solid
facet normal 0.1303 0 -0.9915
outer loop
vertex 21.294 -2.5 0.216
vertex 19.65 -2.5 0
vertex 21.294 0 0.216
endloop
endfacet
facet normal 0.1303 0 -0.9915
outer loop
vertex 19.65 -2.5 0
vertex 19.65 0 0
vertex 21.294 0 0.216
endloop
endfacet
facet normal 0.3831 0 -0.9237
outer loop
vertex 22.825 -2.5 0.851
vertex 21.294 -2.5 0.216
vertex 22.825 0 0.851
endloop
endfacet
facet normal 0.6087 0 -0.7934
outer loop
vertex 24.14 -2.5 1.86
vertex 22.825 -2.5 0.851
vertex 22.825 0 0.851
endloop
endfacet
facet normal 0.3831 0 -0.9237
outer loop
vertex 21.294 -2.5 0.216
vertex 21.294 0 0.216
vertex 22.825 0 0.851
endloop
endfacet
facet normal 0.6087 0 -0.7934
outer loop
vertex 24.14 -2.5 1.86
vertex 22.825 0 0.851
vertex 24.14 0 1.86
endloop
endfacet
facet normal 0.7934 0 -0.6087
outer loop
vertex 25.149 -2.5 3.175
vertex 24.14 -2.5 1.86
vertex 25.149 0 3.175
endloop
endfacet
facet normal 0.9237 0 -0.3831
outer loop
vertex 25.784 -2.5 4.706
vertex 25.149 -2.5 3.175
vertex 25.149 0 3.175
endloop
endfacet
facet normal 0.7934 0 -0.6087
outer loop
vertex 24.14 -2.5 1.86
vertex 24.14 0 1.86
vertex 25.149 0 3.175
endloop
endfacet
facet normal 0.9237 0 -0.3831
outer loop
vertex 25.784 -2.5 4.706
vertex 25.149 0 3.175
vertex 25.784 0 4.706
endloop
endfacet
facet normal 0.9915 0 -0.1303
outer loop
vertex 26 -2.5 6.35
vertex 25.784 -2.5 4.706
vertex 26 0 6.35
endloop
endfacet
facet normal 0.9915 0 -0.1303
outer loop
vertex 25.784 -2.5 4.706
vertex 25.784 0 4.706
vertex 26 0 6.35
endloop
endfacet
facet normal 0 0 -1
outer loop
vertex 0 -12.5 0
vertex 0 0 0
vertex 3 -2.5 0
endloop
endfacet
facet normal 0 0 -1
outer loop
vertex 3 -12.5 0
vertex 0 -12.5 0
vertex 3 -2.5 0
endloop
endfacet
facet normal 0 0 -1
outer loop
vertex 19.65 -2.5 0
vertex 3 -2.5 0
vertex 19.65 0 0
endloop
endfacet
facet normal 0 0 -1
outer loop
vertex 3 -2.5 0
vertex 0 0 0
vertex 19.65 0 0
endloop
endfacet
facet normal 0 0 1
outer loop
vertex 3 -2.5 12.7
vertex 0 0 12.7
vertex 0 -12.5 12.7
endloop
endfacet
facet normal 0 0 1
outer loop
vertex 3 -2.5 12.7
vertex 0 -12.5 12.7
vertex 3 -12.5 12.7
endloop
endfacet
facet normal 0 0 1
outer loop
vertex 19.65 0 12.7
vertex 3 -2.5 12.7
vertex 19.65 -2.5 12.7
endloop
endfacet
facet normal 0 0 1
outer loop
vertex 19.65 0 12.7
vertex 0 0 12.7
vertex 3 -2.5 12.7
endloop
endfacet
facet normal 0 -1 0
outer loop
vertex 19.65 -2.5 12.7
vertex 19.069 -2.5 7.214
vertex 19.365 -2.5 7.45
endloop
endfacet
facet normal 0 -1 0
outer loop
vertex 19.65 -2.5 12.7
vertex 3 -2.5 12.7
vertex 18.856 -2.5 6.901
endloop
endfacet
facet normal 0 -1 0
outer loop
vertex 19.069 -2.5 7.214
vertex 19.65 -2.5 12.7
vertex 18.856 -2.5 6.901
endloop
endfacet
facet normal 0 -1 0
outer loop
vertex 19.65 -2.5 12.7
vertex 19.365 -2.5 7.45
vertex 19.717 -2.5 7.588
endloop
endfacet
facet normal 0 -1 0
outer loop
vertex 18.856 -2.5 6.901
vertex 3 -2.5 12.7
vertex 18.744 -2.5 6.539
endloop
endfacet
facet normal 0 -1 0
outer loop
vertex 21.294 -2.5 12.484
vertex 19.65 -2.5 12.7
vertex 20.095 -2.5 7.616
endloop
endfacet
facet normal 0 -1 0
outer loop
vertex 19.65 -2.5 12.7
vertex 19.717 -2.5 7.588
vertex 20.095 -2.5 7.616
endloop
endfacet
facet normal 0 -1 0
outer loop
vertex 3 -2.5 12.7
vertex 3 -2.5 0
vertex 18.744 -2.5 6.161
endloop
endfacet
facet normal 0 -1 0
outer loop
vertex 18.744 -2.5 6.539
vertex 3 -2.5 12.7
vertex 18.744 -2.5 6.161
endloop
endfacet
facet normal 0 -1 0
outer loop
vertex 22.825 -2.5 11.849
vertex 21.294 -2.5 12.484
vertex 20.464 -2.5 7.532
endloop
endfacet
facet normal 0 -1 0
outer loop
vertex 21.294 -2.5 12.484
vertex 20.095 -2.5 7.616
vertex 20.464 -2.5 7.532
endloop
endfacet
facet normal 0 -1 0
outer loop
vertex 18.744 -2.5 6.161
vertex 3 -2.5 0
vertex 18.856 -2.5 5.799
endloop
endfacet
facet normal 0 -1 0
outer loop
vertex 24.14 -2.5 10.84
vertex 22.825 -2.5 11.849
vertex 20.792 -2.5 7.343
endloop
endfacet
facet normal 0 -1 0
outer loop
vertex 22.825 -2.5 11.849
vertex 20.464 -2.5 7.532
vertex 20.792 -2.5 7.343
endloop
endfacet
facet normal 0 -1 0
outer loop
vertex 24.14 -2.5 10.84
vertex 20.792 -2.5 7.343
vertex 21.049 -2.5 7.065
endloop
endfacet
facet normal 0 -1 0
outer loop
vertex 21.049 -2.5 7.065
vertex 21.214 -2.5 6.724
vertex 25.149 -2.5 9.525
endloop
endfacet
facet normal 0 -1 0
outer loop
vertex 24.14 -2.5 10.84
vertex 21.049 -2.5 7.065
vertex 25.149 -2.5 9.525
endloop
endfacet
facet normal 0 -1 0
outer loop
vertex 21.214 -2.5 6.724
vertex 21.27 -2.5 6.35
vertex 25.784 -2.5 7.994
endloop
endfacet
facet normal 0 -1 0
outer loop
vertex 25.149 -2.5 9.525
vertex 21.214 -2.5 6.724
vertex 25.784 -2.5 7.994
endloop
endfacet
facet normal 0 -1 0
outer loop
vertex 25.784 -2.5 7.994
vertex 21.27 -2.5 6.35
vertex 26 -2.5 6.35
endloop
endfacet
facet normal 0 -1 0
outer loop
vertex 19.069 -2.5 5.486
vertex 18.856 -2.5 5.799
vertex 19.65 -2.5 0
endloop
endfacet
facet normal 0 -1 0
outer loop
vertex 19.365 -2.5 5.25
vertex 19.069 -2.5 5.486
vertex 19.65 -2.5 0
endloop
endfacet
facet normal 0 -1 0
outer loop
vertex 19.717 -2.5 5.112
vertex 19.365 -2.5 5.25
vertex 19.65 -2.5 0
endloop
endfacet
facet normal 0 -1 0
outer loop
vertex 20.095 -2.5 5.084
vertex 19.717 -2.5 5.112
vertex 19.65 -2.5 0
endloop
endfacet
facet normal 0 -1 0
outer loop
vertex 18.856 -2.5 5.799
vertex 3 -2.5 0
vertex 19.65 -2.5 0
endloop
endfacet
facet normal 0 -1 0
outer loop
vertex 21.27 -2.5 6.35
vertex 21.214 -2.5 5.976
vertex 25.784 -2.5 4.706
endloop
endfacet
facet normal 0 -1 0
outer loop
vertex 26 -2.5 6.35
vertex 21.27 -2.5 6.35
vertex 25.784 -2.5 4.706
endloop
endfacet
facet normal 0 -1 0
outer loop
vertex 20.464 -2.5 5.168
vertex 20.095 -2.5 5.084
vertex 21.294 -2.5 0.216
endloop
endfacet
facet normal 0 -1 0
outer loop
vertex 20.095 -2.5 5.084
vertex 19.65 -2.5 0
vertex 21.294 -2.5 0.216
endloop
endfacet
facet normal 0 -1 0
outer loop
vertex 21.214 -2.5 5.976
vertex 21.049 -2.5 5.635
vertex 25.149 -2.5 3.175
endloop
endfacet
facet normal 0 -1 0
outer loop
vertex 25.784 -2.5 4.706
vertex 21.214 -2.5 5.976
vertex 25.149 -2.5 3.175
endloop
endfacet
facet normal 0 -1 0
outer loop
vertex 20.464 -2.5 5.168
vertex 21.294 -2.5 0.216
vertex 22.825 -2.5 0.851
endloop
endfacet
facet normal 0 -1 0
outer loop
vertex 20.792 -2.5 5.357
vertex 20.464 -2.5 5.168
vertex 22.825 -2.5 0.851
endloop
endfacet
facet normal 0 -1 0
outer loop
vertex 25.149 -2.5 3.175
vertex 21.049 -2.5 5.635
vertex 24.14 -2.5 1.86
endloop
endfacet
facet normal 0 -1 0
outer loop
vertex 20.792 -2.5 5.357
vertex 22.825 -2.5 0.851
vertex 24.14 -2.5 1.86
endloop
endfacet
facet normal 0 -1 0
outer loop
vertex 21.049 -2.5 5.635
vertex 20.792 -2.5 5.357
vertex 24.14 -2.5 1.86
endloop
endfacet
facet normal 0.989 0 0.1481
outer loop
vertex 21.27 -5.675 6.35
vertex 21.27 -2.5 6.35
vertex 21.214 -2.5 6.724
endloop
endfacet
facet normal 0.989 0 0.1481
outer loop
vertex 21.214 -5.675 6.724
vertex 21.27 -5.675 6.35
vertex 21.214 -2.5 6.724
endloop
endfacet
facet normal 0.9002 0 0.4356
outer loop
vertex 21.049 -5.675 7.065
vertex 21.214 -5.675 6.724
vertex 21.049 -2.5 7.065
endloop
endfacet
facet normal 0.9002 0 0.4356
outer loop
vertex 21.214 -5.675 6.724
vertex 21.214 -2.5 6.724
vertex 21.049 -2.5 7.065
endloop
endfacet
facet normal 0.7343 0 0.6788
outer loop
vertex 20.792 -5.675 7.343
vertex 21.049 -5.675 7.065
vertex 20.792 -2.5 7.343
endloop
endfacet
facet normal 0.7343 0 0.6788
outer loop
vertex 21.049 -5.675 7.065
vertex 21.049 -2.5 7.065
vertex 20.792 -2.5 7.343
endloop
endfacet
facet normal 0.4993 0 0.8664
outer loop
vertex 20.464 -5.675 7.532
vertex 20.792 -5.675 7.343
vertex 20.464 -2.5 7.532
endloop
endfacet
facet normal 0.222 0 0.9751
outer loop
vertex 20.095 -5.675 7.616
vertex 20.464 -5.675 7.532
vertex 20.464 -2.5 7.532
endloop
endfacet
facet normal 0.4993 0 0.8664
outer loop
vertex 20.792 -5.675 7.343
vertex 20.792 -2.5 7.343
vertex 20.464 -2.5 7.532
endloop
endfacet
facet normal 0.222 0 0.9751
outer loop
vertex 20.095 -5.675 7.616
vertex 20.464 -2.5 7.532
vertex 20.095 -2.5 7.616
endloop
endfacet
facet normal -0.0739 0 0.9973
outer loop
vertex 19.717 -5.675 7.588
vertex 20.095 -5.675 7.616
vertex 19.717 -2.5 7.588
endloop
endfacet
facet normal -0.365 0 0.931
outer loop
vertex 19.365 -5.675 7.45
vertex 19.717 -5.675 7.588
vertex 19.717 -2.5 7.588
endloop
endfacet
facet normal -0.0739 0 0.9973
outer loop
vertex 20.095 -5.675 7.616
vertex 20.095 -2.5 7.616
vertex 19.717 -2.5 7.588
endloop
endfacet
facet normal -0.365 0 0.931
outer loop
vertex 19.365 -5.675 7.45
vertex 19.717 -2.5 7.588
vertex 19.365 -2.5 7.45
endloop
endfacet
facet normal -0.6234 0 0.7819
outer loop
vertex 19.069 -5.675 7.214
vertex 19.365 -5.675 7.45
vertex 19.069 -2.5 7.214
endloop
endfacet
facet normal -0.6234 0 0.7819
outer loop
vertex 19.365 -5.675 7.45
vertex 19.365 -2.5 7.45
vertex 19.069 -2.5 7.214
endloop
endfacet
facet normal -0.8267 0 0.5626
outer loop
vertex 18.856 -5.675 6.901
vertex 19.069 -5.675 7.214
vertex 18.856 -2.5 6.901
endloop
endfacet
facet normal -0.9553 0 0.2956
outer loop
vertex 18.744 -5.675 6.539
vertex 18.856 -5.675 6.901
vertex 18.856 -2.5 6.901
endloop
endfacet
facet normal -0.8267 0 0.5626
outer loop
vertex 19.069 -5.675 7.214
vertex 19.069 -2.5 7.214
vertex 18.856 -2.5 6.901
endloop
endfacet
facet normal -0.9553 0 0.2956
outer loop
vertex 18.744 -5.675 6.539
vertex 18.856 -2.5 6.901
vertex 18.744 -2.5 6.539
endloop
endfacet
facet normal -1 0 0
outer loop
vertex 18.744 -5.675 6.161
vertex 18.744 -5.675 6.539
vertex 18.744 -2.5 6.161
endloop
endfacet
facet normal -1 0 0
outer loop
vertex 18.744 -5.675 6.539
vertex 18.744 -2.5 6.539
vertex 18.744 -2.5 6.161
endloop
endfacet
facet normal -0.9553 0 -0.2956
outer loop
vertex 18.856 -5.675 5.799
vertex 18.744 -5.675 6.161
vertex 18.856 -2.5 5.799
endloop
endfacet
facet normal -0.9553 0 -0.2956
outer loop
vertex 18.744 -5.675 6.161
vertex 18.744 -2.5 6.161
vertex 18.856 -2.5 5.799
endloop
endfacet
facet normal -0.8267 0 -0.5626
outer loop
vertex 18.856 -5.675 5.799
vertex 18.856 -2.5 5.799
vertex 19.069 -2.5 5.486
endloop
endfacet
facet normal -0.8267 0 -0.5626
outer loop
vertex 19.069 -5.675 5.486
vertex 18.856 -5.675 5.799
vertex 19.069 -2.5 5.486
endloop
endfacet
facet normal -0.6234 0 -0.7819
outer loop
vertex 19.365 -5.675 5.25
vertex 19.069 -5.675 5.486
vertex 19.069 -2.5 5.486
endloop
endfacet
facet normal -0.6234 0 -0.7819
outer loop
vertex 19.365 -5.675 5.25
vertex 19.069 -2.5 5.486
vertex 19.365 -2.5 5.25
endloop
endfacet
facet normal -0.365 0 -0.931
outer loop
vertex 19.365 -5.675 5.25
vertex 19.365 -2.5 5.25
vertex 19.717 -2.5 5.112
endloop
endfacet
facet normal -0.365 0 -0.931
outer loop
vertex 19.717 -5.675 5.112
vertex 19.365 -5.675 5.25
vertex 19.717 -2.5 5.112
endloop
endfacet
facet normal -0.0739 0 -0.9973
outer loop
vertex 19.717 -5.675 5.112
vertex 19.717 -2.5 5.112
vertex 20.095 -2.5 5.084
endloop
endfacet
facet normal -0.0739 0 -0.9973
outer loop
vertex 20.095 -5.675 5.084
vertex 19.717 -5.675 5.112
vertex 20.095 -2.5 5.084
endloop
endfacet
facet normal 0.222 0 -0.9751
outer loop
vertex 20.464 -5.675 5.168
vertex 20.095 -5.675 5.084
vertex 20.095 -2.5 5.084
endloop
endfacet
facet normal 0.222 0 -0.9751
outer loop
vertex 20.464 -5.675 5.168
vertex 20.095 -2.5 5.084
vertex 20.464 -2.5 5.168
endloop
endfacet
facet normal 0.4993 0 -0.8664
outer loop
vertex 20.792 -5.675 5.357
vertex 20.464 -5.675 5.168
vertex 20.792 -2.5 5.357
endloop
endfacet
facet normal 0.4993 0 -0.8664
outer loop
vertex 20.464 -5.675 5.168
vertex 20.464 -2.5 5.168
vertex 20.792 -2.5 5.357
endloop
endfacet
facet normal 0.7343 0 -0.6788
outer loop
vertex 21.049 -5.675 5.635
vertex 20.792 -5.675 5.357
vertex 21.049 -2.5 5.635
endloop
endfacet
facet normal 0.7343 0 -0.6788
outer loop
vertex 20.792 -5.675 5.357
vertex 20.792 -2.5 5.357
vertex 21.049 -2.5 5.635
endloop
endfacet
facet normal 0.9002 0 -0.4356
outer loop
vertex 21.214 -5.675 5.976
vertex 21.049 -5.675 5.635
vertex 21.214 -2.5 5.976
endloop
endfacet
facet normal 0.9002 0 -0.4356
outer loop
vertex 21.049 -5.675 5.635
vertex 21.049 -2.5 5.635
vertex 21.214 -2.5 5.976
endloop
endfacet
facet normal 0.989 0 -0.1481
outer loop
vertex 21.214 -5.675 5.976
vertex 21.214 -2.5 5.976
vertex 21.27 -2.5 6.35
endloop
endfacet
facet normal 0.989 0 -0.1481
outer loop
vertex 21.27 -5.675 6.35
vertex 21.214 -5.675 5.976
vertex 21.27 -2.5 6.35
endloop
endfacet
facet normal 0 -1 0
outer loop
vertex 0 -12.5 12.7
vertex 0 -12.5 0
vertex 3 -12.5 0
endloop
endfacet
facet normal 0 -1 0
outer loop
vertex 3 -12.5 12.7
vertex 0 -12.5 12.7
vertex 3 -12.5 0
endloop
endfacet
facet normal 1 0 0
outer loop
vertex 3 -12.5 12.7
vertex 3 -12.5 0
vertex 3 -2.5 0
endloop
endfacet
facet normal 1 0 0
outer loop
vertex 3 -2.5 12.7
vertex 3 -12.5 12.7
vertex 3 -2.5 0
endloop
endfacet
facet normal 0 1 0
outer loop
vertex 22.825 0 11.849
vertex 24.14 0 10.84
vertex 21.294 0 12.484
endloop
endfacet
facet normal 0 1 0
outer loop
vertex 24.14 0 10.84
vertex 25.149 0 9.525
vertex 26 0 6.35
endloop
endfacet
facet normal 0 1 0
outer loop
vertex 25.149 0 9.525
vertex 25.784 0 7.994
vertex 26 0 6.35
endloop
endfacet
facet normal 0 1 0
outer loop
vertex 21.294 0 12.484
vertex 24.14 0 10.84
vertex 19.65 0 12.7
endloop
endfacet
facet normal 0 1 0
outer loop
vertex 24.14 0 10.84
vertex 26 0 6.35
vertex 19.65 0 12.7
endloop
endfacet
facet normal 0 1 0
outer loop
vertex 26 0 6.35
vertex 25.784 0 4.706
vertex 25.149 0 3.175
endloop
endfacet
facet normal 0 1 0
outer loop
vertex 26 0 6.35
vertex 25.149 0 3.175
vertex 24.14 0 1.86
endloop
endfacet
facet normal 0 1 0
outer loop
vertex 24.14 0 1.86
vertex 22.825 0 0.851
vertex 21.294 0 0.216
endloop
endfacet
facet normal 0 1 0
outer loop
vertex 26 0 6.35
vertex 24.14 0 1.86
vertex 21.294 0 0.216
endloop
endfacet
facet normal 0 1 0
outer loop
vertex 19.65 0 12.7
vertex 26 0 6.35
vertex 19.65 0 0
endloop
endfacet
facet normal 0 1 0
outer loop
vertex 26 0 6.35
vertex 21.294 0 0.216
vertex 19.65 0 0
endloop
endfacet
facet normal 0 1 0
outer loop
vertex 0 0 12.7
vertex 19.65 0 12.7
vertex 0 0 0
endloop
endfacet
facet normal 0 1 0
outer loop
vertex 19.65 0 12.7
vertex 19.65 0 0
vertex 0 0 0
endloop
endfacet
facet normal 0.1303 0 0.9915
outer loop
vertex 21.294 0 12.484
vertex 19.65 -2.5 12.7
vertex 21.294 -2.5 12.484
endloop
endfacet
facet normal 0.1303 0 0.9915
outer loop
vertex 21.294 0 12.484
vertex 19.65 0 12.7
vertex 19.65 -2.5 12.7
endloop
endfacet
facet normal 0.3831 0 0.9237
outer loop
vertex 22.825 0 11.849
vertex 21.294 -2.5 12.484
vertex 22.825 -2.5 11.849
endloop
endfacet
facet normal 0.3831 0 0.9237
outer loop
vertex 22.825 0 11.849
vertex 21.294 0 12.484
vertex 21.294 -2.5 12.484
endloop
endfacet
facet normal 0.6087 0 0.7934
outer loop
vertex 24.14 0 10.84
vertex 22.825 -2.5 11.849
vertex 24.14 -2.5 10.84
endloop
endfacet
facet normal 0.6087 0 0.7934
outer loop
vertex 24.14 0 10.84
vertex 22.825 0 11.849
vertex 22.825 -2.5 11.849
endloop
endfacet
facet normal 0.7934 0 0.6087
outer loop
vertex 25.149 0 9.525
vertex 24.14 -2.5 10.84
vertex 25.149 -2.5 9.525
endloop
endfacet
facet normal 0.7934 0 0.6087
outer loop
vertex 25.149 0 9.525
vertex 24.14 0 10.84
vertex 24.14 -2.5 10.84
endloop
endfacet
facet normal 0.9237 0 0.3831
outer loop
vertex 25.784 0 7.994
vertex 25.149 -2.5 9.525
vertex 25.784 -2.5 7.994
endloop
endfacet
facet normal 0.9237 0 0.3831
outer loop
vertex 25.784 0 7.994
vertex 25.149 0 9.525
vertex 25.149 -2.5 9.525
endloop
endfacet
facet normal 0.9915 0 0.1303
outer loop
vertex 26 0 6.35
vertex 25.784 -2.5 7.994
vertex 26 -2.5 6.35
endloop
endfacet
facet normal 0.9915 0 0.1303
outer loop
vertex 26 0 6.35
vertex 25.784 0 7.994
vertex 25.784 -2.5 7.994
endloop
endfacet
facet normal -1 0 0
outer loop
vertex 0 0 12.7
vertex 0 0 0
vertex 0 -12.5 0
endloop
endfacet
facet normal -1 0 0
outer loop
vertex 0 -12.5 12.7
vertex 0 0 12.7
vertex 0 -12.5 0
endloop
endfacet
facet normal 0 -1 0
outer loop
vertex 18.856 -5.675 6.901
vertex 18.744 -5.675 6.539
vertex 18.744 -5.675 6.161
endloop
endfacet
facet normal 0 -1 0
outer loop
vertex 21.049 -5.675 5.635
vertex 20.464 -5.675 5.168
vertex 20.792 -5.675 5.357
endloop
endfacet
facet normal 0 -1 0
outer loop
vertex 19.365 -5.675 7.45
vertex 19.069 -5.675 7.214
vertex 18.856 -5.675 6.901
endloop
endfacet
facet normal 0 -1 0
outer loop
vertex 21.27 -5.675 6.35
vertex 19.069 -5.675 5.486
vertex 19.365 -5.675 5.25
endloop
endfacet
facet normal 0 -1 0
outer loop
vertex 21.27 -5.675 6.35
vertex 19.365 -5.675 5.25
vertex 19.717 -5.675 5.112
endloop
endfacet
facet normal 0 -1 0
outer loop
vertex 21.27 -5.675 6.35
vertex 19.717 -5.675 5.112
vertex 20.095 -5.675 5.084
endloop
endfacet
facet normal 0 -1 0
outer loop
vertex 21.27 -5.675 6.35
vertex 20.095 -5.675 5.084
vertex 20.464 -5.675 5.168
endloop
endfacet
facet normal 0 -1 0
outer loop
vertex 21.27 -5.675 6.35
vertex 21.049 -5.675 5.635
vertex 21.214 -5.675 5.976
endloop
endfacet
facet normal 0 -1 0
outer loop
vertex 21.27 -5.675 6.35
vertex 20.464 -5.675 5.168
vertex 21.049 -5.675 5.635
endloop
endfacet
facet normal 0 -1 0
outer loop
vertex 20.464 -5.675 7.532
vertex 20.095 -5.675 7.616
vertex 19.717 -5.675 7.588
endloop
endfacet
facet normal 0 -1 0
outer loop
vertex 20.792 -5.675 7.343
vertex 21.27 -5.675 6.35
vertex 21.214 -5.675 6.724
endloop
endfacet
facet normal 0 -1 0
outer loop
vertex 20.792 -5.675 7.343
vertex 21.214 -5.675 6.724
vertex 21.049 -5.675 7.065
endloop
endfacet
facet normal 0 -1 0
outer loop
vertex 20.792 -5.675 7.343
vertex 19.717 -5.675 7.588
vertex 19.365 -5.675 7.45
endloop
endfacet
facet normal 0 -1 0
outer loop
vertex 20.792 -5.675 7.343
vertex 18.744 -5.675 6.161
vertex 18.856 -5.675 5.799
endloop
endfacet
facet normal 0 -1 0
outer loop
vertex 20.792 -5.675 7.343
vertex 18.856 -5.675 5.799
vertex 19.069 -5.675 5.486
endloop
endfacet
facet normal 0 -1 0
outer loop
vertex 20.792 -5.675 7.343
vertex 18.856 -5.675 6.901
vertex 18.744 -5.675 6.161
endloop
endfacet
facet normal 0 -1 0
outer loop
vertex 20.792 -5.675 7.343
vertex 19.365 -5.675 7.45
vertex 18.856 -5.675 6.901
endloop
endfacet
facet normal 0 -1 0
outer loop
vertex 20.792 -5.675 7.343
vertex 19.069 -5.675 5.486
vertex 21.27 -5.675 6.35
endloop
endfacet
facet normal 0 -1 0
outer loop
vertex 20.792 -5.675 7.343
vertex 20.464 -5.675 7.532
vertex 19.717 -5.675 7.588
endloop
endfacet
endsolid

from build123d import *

# Parameters (mm, degrees)
F1_DEPTH = 12.7
F2_R     = 1.27
F3_DEPTH = 3.175
F4_R     = 6.34999


# Not quite as in the source:
# - a fillet or chamfer is up to 0.001 mm smaller than in the source, because OpenCascade refuses the exact size


with BuildPart() as f1:
    # F0 (on Top) → F1 (new body)
    with BuildSketch(Plane.XY):
        Polygon((0, -12.5), (3, -12.5), (3, -2.5), (26, -2.5), (26, 0), (0, 0), align=None)
    extrude(amount=F1_DEPTH)

    # F2 (on face) → F3 (join)
    with BuildSketch(Plane.XZ.offset(2.5)):
        with Locations((20, 6.35)):
            Circle(F2_R)
    extrude(amount=F3_DEPTH)

    # F4 (radius 6.35 in the source; OpenCascade refuses exactly that, so slightly less here)
    f4_edges = [f1.edges().sort_by_distance(p)[0] for p in [
        (26, -1.25, 12.7),
        (26, -1.25, 0),
    ]]
    fillet(f4_edges, radius=F4_R)


solid = f1.part
